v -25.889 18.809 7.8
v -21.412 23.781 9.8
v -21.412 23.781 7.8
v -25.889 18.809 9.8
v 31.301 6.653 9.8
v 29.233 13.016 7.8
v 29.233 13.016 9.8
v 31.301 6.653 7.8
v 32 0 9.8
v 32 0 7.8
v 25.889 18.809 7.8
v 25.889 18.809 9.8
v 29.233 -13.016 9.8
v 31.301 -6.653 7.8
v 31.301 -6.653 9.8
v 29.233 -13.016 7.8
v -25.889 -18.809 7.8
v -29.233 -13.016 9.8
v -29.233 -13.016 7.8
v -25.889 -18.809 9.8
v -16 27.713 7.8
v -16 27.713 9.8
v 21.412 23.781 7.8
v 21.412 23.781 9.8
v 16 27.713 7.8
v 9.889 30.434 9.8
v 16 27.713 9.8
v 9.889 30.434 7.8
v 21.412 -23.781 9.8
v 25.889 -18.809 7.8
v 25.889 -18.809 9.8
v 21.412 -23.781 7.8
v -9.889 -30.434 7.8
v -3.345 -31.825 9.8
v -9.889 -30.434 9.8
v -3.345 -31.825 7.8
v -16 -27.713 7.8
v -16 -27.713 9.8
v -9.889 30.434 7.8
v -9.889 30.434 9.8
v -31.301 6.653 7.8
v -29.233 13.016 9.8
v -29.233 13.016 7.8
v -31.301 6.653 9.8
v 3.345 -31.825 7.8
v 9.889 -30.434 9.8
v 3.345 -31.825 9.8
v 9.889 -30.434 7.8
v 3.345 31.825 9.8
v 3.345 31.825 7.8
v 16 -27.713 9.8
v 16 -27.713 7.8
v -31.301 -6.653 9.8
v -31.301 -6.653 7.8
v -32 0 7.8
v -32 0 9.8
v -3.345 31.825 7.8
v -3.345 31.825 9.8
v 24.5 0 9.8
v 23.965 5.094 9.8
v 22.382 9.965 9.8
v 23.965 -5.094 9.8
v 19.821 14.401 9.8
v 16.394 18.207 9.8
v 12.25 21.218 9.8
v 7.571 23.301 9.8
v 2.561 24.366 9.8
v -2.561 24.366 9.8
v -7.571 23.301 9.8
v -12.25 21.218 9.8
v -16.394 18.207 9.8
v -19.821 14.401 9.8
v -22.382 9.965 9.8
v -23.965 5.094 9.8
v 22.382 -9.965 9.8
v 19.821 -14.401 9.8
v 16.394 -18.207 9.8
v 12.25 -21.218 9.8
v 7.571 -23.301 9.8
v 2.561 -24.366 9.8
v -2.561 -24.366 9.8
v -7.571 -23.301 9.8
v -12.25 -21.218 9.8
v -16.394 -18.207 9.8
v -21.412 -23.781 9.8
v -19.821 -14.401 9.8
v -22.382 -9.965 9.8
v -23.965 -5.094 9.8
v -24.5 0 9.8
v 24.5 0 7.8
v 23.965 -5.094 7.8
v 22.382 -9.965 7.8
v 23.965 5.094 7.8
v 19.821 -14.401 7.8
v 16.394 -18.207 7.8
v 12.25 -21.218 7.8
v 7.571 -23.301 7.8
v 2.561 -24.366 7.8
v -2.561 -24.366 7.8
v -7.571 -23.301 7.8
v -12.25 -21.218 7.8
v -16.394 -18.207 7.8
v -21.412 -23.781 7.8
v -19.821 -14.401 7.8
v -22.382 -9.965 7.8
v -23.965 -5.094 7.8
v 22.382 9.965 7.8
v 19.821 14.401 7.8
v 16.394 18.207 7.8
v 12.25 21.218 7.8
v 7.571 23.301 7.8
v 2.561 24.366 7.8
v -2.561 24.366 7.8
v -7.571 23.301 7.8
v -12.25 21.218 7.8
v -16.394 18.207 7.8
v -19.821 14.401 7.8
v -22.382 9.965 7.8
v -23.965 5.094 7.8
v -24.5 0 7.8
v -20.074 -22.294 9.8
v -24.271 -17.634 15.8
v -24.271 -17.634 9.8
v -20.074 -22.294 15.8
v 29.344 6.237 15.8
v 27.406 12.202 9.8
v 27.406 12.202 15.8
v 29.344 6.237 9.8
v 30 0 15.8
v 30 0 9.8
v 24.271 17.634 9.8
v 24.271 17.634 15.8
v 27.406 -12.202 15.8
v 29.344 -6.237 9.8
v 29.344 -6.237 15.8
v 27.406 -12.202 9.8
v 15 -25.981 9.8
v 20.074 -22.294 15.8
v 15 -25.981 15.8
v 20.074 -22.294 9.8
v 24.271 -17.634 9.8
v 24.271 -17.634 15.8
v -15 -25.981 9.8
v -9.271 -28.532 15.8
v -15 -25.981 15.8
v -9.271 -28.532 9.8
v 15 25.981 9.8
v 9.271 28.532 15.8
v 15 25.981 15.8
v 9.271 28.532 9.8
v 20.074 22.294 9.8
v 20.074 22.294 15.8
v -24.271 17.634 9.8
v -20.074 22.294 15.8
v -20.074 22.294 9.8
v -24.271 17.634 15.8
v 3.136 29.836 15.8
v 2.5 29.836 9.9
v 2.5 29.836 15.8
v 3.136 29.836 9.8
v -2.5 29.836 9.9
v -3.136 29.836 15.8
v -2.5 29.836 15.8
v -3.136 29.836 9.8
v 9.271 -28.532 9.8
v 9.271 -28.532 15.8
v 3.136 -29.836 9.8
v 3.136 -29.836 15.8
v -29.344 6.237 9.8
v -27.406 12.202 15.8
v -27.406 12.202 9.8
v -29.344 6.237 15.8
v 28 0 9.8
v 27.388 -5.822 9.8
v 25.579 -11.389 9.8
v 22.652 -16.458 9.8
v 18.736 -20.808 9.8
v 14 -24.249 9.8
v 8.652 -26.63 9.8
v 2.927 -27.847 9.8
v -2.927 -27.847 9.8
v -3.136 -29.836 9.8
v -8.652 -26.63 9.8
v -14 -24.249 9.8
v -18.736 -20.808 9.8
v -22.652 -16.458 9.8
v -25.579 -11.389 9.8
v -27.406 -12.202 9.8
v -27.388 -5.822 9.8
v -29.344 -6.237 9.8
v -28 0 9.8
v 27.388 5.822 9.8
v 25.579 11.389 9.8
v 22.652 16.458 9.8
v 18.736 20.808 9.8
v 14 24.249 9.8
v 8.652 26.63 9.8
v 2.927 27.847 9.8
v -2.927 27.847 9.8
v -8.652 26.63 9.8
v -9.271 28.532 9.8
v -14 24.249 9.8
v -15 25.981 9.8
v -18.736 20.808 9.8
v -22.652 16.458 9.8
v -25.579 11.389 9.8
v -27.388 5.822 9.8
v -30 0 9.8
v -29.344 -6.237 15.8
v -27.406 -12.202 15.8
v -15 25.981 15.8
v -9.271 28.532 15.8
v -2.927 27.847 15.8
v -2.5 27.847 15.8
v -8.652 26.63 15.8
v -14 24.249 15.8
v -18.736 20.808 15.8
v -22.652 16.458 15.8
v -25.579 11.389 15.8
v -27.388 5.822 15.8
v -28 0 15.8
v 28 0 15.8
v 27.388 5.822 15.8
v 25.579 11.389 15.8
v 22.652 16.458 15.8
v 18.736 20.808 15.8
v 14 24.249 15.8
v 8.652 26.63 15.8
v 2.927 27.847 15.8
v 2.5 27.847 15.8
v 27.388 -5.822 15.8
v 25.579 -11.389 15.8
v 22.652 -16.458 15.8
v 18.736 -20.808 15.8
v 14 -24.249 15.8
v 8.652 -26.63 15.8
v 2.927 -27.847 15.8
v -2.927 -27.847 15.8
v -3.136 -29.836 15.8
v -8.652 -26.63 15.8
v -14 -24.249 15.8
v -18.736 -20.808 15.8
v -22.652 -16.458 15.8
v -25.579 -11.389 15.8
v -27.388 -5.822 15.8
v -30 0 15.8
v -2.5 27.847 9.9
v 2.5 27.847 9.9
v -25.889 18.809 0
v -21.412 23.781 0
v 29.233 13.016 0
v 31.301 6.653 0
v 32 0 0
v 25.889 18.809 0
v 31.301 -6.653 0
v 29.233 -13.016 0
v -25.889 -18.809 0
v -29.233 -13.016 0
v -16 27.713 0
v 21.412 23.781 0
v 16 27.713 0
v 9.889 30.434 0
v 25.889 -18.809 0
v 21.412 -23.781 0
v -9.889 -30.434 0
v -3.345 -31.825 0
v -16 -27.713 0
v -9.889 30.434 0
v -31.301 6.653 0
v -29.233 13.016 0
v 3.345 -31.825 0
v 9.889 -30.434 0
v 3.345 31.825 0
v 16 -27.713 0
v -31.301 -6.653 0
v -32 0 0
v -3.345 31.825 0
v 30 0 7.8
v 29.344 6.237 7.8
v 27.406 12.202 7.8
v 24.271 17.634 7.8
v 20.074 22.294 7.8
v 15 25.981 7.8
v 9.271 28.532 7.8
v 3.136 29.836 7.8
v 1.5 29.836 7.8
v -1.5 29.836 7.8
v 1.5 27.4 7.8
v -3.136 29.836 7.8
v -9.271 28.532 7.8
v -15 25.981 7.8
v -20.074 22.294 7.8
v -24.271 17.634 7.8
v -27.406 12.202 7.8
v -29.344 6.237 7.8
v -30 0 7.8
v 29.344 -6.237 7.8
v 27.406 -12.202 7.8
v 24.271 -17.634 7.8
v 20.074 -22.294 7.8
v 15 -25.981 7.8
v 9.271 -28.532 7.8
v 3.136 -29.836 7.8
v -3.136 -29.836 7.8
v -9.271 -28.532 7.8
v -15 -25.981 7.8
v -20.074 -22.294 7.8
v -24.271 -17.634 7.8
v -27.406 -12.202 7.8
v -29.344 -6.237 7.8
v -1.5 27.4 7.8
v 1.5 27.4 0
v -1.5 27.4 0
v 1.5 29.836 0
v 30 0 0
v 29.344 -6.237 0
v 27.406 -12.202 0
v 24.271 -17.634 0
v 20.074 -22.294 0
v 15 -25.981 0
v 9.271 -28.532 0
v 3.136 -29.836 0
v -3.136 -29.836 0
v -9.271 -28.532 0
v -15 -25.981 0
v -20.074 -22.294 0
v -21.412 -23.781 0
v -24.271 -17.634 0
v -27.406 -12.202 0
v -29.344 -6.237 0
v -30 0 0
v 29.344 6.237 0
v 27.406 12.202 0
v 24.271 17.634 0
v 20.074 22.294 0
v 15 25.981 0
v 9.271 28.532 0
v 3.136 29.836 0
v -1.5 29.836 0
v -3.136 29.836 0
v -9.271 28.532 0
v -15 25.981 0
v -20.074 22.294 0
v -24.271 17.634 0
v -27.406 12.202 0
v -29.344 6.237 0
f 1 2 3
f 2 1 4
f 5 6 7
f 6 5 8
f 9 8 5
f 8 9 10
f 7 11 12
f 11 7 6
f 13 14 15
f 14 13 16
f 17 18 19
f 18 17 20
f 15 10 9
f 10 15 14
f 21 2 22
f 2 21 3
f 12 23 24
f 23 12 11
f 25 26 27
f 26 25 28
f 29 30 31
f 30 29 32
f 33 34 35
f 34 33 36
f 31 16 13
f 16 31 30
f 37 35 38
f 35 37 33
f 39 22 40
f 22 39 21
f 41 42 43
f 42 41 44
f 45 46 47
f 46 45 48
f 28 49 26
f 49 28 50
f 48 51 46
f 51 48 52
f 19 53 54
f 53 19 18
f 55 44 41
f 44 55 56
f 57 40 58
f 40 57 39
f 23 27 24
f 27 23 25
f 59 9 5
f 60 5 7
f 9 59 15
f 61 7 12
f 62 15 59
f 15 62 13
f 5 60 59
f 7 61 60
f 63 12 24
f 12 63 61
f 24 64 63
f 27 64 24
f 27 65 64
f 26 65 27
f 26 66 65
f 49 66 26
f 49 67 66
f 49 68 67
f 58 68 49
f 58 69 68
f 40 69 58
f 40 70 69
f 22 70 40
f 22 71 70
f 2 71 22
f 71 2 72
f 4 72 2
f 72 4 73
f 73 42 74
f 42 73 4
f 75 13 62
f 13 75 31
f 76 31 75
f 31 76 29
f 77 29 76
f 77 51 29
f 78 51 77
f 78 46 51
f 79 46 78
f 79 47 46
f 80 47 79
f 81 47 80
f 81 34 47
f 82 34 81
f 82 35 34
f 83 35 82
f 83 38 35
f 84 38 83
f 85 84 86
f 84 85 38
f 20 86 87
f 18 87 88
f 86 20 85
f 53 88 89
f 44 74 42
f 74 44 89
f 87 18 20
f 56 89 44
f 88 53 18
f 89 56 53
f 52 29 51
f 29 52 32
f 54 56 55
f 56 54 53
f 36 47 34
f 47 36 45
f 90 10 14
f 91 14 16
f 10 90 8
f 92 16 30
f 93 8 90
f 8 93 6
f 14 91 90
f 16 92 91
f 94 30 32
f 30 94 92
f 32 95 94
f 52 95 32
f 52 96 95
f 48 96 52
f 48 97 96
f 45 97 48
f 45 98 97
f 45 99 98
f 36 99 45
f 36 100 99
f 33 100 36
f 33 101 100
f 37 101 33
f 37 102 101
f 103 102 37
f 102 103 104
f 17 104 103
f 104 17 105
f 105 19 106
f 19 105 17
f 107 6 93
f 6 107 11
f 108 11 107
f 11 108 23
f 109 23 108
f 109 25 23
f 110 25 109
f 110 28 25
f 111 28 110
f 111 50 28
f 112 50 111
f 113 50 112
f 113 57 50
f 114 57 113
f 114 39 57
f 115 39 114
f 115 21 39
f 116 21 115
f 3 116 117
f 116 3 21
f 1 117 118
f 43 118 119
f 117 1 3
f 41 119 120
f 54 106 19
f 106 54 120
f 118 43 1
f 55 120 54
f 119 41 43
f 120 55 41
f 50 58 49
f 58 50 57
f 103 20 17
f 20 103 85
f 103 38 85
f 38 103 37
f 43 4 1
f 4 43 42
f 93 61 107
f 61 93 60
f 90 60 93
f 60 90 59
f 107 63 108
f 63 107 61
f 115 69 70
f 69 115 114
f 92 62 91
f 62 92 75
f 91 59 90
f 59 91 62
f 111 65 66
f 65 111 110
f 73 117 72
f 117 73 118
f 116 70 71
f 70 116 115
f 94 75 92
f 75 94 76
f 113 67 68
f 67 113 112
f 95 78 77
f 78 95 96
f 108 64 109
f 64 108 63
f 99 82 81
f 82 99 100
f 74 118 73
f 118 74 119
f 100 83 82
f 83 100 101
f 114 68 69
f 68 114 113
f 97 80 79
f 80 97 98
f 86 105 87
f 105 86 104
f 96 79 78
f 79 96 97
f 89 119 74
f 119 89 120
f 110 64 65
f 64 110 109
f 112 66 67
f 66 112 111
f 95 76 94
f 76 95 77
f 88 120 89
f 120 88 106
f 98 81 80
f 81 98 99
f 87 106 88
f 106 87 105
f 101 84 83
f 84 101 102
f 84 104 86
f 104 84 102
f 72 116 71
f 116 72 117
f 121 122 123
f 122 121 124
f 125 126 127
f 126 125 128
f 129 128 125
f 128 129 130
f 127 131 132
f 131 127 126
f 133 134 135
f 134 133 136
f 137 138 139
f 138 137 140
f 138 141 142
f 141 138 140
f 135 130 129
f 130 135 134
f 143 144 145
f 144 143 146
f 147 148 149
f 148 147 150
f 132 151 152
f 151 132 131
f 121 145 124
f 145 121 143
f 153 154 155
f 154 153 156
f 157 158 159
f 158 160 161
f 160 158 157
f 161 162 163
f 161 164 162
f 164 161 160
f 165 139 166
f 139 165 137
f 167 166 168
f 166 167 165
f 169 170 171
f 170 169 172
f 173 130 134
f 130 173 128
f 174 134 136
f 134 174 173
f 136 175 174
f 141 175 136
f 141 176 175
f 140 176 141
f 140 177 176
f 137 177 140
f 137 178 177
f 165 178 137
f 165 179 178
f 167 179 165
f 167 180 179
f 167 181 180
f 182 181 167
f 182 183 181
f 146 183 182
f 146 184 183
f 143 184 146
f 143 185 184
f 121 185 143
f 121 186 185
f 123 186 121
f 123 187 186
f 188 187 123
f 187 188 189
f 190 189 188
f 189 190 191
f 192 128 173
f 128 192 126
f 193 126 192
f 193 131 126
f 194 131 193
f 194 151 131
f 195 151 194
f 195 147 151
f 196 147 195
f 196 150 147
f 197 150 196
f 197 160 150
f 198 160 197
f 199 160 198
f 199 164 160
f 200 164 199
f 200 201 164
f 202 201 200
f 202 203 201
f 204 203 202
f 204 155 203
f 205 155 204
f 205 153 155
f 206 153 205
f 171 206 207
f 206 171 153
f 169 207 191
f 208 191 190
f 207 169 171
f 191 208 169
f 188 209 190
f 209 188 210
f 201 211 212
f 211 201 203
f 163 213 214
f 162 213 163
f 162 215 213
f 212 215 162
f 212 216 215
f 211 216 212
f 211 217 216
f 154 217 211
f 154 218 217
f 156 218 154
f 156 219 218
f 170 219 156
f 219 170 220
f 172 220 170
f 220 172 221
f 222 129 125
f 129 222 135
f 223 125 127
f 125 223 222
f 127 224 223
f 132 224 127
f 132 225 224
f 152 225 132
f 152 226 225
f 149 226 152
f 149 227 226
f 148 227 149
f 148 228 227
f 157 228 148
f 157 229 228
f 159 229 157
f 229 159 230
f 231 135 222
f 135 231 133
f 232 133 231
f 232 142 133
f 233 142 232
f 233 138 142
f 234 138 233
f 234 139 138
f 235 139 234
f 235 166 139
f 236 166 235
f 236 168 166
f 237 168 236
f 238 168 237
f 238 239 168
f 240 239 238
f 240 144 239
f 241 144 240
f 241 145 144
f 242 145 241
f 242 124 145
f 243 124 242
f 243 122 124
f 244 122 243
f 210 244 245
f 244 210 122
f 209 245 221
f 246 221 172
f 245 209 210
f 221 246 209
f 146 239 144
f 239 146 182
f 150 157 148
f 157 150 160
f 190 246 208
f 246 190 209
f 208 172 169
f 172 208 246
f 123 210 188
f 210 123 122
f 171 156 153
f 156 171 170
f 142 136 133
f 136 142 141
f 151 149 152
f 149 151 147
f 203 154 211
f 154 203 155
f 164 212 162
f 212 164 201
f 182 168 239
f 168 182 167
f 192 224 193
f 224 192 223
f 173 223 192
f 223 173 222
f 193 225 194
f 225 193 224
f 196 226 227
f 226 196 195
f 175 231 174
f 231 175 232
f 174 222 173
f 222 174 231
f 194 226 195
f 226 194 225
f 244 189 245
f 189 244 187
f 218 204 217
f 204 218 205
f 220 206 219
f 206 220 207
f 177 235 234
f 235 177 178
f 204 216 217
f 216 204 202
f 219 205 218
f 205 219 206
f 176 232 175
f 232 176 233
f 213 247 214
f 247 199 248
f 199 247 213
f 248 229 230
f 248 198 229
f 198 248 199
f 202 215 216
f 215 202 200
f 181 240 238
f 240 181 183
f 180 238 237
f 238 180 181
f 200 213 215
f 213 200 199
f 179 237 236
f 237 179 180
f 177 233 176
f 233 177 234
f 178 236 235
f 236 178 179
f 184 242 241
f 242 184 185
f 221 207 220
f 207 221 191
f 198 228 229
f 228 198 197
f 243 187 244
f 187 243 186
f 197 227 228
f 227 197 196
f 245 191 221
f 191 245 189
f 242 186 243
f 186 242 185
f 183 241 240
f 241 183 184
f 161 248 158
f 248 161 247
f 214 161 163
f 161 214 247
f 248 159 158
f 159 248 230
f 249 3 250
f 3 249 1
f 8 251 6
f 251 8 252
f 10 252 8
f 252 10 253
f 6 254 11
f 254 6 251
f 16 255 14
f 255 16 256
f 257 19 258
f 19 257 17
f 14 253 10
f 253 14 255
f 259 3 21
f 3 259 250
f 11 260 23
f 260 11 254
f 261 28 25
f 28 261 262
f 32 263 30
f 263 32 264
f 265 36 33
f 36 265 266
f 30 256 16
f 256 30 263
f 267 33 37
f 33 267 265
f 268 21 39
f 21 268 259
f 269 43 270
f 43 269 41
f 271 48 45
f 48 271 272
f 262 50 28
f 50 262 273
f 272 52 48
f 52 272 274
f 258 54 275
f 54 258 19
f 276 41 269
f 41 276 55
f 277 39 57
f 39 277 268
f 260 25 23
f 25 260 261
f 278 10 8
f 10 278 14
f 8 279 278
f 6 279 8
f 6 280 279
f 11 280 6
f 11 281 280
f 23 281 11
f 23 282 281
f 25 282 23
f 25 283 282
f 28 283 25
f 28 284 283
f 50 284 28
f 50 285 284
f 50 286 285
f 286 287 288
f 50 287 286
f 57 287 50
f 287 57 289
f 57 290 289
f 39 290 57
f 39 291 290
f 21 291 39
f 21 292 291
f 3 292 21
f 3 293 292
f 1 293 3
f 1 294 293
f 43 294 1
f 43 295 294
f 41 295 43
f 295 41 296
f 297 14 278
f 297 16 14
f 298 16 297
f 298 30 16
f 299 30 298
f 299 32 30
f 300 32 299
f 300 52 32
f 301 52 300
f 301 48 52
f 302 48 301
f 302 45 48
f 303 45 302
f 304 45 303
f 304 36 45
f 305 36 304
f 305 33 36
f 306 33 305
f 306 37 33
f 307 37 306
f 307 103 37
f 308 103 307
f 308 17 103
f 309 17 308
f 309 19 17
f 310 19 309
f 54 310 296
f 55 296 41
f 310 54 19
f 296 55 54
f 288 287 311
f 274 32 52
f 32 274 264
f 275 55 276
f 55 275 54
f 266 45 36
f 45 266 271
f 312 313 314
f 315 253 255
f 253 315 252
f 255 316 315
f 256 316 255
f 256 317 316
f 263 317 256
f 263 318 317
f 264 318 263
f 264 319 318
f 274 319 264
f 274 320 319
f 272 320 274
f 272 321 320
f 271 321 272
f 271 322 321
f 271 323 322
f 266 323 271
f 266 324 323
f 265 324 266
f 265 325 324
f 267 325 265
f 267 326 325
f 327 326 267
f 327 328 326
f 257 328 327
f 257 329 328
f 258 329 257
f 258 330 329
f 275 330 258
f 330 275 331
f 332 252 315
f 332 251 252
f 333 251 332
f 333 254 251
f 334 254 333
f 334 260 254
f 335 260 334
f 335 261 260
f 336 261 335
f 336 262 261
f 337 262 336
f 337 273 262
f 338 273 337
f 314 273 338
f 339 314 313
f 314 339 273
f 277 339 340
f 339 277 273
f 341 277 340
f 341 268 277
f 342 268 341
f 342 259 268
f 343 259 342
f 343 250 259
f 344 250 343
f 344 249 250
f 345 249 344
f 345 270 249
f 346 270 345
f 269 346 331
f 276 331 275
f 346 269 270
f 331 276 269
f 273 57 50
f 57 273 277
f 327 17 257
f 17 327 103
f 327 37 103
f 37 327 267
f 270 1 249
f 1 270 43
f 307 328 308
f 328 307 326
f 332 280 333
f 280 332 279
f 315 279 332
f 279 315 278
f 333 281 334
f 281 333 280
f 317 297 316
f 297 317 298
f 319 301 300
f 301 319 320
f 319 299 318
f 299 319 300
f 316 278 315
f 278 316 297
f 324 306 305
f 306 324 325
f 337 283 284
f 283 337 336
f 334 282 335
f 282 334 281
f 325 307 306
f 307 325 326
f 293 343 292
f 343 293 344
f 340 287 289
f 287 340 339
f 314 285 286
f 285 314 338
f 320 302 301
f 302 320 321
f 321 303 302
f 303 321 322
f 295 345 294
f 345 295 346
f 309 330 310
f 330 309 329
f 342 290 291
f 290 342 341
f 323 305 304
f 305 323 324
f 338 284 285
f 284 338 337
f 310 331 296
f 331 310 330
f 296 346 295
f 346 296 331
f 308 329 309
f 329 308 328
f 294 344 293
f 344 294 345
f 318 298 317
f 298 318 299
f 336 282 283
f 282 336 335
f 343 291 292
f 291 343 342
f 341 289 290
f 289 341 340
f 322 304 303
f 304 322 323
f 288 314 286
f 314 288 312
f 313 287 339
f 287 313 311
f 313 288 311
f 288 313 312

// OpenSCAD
// file: settingsLenghts.scad
//Ancho de la pared
pared  = 2;
//Radio del centro hueco
radioC = 11;
//Alto de la capa de apertura
aperH = 5.5;
//Ancho de la apertura
aperW = 5+1.1;//Ancho mas holgura
//Ancho del lente macro
macroW = 9.3;
//Profundidad del macro
macroH = 3;
//Profundidad parte de atras y delante
profDelante = 6;
profAtras = 6;
//Ceja entre uniones de cilindros
cejaH = 6;
guiaParedW = 2;
tmpHolg = 1.8;


//Correcc

//
//CÁMARA
camP = 3;//Grueso de la pared del presente modelo
camW = 105;//Ancho de la cámara
camH = 61;//Alto de la cámara
camD = 23.5;//Profundidad de la cámara
camHlg = 6;//Holgura que se deja para los tornillos
camLW = 57/2;//Radio del exterior del lente
torW  = 2;//Radio

//
//Ancho de tubo principal (grande)
mcW = 32;//radio
mcH = 28;

//Dimensiones del difractador
diffW = 51;//Alto y Ancho
diffD=1;//Profundidad del difractador
diffWinW=36;//Ancho de la ventana de difracción
diffWinH=24;//Alto de la ventana de difracción

//
//Adquisición de luz
luzHBig = 10; //donde va el tornillo
luzWBig = 28; //27:diametro donde va el tornillo
luzHBigT = 4; //alto del tornillo
luzWBigT = 6; //6: ancho del tornillo
luzHRosca = 7; //donde va la rosca
luzWRosca = 23; //22:diametro de donde va la rosca



//Cuadro guia para que no se mueva
guiaH = cejaH;
guiaW = 3;



module creaPared(h){
	difference(){
		//Pone el cilindro principal
		cylinder(r=mcW,h);

		//Le quita el contorno exterior
		translate([0,0,-0.1])
		cylinder(r=mcW-pared,h+0.2);
	}
}
module creaGuiaTornilloCentrada(){
	translate([-luzWBigT/2,-luzWBigT/2,0])
	cube([luzWBigT,luzWBigT,luzHBig-1+0.2]);
}
module creaGuiaTornilloCentradaArea(){
	tmpW = luzWBigT + pared;
	tmpH = luzHBig  + pared;
	translate([-tmpW/2,-tmpW/2,0])
	cube([tmpW,tmpW,tmpH]);
}
module creaGuia(h){
	//Pone el circulo soporte
	difference(){
		cylinder(r=mcW,h);
		translate([0,0,-0.1])
		cylinder(r=mcW-pared,h+0.2);
	}
	//Pone la guia1
	translate([0,mcW-pared-(guiaW/2)+0.4,0])
	creaGuiaCentrada(h);
}
module creaGuiaHembra(h){
	//Pone el circulo soporte
	tmpW = mcW-guiaW;	
	creaPared(sopH);
	sopH = 1.35;
	
	//Pone la pared de la guia
	difference(){
		cylinder(r=(mcW-pared),sopH+h);
		translate([0,0,-0.1])
		cylinder(r=(mcW-pared-guiaParedW),sopH+h+0.2);
		//Pone la guia
		translate([-(guiaW/3),tmpW,sopH])
		creaGuiaCentrada(sopH+h+0.2);
		translate([(guiaW/3),tmpW,sopH])
		creaGuiaCentrada(sopH+h+0.2);
	}
}
module creaGuiaCentrada(h){
	translate([-guiaW/2,-guiaW/2,0])
	cube([guiaW,guiaW,h]);
}
// main file
include <settingsLenghts.scad>


/////////////////////////////////////

// Cuanto se deja entre la tapa auxiliar y la planta alta
tmpHolg = 1.8;

//Pone la apertura
translate([0,0,cejaH+tmpHolg])
creaCilApertura();

//Pone la guia hembra
translate([0,0,cejaH+pared+tmpHolg])
creaGuiaDeAjuste(cejaH);

//Pone guia macho
creaGuia(cejaH+tmpHolg);




module creaGuiaDeAjuste(h){
	//Pone el circulo soporte
	tmpW = mcW-guiaW;	
	tmpWSop = 0;//cejaH/2 para imprimir con soporte
	//creaPared(tmpWSop);//Soporte
	
	//Pone la pared de la guia
	difference(){
		cylinder(r=mcW-pared,tmpWSop+cejaH);
		translate([0,0,-0.1])
		cylinder(r=mcW-pared-pared,h+cejaH+0.2);
		//Pone la guia
		translate([-(guiaW/3),tmpW,tmpWSop+0.1])
		creaGuiaCentrada(h);
		translate([(guiaW/3),tmpW,tmpWSop+0.1])
		creaGuiaCentrada(h);
		//Repite la guia porque no alcanza
		translate([-(guiaW/3),tmpW-(guiaW/2),tmpWSop+0.1])
		creaGuiaCentrada(h);
		translate([(guiaW/3),tmpW-(guiaW/2),tmpWSop+0.1])
		creaGuiaCentrada(h);
	}
}
module creaCilApertura(){
	apertW = 49/2;//Radio
	difference(){
		//Pone el cilindro principal
		cylinder(r=mcW,pared);

		//Le quita la apertura
		translate([0,0,-0.1])
		cylinder(r=apertW,pared+0.2);
	}
}
